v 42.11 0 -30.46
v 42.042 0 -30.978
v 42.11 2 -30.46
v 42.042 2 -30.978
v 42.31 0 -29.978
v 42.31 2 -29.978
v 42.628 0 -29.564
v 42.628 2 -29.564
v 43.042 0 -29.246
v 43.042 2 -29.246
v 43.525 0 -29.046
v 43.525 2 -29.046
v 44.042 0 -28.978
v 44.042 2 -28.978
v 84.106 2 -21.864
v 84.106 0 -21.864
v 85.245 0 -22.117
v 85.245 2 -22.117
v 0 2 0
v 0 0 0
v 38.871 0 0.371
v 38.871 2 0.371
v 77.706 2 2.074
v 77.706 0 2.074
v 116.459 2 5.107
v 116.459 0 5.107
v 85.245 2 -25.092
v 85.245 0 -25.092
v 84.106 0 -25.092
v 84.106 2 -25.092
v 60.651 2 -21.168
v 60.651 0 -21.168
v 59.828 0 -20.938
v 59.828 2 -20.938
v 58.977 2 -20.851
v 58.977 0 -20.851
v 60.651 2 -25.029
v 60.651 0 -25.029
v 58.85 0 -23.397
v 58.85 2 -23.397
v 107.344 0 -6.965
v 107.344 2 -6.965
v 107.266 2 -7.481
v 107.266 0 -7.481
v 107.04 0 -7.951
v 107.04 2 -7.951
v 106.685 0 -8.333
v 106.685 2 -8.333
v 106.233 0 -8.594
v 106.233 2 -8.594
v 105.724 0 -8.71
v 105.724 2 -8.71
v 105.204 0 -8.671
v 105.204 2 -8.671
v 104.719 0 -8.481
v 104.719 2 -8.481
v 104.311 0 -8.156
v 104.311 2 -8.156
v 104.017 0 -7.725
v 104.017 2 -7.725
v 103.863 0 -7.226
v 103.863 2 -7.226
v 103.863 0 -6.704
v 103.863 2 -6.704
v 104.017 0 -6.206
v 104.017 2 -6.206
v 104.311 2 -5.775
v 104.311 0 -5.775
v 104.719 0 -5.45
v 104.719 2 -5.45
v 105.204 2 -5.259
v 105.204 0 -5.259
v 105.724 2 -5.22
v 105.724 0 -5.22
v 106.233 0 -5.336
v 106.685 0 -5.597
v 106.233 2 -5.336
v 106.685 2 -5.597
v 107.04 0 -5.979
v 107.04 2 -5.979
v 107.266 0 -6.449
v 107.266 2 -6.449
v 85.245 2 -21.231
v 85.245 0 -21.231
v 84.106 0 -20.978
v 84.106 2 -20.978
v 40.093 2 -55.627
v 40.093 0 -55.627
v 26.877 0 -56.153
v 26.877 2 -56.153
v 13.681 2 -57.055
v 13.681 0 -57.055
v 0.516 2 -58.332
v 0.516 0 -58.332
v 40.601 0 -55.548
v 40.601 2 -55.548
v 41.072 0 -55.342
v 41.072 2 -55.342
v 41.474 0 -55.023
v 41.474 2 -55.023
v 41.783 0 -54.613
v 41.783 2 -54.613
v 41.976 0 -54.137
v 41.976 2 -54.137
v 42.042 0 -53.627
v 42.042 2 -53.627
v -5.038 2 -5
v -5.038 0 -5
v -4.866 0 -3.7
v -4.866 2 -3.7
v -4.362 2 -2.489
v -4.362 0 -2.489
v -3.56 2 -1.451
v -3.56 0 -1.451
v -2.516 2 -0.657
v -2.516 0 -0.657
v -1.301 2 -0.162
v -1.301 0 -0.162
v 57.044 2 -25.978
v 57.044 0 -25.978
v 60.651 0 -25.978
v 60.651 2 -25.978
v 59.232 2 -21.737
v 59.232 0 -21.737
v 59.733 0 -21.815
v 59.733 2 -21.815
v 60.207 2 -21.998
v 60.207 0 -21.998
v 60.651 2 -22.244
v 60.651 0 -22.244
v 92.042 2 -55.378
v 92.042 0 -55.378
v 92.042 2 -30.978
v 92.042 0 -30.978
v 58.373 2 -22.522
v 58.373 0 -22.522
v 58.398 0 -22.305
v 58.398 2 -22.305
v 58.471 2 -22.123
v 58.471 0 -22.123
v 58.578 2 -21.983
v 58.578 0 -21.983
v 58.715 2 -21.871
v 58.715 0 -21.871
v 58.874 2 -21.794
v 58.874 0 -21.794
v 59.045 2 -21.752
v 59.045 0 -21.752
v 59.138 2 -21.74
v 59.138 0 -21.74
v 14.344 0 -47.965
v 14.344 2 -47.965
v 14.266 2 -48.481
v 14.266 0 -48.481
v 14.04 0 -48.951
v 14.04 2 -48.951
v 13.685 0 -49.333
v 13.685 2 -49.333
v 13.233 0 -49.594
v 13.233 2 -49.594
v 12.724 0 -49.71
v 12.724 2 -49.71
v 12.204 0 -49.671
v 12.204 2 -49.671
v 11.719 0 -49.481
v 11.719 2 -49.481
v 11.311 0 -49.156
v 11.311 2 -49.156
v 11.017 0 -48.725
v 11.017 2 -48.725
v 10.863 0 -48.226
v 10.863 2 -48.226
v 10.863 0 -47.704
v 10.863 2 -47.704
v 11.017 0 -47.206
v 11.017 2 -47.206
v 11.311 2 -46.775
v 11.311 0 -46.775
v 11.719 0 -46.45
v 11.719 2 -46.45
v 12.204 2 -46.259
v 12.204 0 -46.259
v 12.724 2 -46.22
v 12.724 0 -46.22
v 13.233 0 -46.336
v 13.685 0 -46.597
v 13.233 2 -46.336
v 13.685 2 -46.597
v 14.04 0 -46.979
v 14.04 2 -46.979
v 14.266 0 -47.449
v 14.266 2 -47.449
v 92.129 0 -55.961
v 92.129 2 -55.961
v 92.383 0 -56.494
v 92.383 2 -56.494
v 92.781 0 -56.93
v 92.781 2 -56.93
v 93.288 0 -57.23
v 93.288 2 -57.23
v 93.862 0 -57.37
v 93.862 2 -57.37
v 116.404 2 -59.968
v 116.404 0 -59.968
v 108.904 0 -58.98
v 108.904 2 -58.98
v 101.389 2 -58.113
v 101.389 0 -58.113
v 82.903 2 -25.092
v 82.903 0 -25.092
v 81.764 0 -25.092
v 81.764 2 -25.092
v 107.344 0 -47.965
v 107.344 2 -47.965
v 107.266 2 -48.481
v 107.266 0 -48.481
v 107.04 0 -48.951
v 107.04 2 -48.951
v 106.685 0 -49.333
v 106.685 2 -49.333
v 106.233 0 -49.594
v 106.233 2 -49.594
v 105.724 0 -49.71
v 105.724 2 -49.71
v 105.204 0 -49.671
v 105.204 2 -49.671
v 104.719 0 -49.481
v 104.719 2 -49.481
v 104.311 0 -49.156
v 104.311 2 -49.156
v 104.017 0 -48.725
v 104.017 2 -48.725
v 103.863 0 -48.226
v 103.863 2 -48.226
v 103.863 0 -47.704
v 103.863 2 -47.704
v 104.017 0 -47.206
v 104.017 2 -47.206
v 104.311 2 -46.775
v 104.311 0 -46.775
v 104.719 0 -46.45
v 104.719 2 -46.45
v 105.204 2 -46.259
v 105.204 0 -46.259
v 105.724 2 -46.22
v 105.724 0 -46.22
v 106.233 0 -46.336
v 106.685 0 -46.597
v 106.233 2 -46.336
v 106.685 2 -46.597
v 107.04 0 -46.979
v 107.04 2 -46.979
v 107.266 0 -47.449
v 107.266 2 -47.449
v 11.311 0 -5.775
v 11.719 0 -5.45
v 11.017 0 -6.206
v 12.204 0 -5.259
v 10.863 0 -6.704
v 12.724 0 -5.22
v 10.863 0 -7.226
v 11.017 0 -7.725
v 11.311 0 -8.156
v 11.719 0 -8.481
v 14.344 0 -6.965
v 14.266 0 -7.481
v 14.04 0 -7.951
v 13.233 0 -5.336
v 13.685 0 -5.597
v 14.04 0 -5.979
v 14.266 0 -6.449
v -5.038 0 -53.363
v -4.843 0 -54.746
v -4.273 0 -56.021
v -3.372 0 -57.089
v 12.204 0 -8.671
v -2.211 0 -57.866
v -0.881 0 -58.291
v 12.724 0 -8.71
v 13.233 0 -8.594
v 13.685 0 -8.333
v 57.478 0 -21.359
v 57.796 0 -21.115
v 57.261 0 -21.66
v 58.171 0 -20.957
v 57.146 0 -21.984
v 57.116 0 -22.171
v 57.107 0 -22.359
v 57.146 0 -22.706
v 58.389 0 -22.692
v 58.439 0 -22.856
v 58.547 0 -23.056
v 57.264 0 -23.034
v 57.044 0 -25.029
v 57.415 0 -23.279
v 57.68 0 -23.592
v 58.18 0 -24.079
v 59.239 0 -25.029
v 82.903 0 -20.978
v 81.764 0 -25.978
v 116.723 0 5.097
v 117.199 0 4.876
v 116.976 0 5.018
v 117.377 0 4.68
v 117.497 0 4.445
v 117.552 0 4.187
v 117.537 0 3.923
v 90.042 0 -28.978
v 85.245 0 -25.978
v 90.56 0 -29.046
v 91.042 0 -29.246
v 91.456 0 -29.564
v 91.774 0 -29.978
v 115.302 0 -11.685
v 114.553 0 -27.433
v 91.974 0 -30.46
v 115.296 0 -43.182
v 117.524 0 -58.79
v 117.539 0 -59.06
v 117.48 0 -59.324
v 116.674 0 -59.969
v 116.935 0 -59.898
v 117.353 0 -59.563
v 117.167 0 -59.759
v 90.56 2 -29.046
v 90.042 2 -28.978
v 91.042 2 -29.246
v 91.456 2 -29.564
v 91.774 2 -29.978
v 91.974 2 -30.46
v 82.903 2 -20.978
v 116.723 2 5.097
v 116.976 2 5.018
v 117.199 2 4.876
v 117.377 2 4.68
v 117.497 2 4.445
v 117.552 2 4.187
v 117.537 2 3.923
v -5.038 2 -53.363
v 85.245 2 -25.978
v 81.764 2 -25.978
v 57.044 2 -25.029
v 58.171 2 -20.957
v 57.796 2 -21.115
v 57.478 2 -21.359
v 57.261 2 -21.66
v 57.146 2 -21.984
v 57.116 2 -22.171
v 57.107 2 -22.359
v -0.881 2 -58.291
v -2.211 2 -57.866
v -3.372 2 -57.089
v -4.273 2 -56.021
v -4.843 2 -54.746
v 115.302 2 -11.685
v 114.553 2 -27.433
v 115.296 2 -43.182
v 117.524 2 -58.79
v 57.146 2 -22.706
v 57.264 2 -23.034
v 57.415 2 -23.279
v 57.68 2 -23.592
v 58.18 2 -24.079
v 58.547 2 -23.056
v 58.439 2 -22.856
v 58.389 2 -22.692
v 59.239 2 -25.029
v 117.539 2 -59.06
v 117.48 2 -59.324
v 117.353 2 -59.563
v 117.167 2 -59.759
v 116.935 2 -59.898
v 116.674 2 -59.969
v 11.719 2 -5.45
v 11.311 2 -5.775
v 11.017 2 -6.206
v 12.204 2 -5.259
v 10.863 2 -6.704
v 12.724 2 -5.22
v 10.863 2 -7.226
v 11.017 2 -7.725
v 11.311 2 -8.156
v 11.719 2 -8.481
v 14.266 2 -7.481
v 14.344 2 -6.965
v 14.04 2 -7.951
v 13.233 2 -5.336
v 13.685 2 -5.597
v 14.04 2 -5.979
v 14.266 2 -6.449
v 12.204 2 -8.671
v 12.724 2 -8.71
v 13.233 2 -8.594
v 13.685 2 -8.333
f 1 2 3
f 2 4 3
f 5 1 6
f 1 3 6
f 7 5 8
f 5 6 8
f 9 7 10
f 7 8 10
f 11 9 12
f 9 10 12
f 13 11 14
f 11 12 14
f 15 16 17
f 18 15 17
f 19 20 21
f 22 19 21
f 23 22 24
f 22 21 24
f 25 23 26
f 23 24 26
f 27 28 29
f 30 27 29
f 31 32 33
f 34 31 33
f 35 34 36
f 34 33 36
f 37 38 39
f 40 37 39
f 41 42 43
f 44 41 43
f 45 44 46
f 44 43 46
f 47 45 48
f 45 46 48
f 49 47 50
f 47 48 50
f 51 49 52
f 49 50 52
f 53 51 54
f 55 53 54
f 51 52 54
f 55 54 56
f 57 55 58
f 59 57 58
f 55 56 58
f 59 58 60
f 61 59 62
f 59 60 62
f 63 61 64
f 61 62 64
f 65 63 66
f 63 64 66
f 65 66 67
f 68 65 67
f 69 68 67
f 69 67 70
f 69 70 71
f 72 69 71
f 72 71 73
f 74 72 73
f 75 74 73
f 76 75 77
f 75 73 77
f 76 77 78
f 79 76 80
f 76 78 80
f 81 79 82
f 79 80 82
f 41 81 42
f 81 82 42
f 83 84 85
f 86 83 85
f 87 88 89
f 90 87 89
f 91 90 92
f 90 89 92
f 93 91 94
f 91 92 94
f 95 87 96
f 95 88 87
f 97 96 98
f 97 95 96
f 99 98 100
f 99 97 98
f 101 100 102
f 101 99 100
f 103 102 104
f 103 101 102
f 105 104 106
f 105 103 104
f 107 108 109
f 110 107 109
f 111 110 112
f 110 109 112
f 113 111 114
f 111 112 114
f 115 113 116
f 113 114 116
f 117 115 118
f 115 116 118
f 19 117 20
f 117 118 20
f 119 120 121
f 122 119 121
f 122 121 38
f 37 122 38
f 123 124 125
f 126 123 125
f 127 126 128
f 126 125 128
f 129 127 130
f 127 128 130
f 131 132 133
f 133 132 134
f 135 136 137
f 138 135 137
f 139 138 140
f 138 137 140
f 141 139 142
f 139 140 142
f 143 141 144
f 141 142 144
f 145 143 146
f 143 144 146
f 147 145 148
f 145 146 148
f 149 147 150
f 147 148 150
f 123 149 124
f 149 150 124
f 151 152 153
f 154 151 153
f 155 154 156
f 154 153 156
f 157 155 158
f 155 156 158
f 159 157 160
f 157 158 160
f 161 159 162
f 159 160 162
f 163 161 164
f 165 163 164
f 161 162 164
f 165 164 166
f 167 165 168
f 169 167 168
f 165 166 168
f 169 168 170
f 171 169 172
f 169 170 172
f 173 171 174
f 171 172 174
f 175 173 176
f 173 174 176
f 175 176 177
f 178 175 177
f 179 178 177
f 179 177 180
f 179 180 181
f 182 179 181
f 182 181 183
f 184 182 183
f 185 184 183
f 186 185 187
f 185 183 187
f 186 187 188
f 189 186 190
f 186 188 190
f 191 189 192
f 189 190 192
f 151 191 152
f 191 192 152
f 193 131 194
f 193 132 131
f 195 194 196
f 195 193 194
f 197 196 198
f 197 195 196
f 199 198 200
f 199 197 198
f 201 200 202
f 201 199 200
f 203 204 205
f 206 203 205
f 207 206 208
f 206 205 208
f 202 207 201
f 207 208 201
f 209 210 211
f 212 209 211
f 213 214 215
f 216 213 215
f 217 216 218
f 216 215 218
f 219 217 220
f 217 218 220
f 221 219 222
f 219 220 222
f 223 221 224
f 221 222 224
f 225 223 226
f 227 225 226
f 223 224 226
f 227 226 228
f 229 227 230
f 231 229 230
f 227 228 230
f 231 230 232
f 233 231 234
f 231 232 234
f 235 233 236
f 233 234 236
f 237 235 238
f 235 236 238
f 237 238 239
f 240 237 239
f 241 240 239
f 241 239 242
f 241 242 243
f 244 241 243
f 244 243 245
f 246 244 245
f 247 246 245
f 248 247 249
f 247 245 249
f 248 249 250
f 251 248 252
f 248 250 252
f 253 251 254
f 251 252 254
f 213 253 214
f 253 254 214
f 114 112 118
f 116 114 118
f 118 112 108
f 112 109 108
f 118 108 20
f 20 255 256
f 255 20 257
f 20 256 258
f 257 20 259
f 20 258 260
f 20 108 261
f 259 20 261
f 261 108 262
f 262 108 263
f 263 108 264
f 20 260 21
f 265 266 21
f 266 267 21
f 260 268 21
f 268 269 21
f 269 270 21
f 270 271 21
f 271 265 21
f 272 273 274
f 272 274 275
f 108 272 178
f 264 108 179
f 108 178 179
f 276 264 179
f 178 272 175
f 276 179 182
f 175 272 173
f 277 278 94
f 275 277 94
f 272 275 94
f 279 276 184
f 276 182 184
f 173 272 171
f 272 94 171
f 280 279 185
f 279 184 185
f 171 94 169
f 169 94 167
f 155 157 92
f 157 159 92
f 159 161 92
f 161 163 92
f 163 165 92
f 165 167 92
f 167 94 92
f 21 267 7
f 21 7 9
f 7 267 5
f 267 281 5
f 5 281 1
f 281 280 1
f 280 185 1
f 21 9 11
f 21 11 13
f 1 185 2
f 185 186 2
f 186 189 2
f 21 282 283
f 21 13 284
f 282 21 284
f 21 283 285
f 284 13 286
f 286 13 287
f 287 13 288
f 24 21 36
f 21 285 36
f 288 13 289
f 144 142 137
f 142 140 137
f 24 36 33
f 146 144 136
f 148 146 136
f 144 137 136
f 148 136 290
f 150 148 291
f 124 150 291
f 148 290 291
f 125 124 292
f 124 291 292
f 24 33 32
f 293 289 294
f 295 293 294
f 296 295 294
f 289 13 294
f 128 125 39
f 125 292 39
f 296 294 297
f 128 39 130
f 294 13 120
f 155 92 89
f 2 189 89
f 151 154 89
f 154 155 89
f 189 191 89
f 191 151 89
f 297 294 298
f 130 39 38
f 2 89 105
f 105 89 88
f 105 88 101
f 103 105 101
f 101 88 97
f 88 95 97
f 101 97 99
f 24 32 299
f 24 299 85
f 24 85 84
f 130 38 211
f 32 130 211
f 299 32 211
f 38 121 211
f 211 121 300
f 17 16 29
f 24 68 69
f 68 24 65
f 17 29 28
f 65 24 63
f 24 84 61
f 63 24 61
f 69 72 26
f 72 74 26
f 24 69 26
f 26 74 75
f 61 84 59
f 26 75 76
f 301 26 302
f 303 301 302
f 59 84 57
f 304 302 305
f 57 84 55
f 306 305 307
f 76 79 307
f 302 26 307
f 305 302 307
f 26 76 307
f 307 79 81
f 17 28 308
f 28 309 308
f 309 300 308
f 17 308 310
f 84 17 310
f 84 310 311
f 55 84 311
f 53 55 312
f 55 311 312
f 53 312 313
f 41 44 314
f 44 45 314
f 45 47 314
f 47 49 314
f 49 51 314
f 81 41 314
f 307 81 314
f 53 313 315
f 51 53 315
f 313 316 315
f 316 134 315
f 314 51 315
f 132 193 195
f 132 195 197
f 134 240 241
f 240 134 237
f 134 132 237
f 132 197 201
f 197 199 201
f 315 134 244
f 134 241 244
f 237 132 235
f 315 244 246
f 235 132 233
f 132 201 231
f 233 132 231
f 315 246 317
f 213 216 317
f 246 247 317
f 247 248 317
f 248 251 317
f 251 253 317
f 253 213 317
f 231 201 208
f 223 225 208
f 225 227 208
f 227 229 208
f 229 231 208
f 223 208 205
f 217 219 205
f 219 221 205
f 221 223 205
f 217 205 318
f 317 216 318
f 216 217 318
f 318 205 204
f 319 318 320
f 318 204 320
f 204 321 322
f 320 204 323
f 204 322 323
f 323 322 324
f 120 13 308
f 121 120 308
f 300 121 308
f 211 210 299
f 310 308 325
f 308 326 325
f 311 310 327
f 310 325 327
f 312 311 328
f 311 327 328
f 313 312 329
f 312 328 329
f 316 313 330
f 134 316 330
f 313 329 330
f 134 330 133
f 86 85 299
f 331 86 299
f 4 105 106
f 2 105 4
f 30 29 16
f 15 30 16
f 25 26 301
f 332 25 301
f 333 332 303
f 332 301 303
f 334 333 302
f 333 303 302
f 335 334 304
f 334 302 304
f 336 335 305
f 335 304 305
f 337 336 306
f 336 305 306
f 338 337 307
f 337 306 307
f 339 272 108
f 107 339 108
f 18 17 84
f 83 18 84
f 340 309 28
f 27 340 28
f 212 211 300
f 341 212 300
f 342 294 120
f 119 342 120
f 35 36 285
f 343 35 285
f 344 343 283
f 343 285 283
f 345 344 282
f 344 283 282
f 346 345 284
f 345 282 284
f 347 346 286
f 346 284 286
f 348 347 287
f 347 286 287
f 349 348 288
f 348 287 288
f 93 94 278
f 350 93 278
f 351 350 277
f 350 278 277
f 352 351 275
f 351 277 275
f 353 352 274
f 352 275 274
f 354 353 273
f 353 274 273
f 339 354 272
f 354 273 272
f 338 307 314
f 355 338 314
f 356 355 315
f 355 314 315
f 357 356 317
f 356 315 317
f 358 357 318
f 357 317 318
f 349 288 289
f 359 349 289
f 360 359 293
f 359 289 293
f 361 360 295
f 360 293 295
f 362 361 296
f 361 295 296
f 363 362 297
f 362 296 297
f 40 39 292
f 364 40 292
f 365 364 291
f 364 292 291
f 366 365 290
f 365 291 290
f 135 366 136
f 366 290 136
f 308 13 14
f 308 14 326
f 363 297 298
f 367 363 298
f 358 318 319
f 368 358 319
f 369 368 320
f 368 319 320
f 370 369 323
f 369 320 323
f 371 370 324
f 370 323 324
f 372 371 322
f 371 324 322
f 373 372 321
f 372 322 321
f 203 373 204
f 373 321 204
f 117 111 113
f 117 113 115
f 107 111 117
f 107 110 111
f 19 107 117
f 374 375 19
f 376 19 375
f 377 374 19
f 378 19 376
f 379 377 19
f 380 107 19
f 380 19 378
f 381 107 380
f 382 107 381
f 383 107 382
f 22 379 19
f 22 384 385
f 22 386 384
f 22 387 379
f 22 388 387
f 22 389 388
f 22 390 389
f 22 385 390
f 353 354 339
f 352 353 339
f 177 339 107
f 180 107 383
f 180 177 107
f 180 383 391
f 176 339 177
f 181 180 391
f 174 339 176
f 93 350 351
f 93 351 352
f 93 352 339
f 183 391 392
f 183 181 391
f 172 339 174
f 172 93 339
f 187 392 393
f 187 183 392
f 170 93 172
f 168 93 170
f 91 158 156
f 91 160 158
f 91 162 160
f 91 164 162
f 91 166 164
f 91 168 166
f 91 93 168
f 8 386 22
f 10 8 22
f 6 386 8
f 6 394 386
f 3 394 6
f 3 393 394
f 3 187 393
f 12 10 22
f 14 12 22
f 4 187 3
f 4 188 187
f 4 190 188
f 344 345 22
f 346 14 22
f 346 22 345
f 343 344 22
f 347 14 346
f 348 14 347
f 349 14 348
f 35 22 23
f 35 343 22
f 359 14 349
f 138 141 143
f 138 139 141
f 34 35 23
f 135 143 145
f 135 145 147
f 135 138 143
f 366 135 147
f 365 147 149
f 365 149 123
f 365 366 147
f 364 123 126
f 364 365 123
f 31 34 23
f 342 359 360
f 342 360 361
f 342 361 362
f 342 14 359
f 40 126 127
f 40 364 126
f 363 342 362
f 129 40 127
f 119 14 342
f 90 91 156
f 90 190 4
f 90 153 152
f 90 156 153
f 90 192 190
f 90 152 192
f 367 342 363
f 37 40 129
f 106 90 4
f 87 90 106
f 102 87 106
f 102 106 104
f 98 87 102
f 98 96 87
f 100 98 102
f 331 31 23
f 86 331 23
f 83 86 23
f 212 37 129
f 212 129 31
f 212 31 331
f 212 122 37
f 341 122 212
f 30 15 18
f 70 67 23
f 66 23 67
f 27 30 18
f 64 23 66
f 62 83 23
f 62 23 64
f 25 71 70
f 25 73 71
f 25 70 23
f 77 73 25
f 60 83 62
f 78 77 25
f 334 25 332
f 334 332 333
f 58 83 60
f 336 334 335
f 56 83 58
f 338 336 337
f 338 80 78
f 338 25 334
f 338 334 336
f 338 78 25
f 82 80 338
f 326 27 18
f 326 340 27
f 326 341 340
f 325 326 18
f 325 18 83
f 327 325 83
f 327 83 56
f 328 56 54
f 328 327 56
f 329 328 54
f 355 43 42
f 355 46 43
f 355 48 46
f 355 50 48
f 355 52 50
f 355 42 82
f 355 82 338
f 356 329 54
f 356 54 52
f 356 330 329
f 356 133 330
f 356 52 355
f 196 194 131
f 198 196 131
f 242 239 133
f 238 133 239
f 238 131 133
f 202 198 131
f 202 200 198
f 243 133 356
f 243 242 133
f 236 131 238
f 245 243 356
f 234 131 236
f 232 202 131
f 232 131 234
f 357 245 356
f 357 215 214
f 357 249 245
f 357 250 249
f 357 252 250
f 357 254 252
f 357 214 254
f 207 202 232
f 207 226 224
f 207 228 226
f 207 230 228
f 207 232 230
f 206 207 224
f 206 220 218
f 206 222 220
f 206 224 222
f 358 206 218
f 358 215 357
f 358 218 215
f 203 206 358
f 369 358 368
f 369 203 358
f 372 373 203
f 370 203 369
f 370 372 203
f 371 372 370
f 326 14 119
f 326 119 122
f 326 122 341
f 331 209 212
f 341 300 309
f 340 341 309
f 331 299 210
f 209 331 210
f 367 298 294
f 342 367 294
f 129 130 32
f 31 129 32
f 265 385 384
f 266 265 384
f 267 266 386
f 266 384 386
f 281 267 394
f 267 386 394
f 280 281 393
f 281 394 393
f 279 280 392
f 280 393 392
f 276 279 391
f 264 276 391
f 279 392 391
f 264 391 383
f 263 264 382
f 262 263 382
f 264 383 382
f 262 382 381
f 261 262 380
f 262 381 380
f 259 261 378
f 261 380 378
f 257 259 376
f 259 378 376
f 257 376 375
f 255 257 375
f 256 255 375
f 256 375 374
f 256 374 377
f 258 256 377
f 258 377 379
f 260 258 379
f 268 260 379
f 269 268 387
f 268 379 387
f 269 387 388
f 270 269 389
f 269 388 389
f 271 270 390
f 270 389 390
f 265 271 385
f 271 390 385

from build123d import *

# Parameters (mm, degrees)
CROQUIS1_R              = 2.175
SALIENTE_EXTRUIR1_DEPTH = 2
CROQUIS2_R              = 2.175
CROQUIS2_R_2            = 1.75
SALIENTE_EXTRUIR2_DEPTH = 2
CROQUIS3_W              = 50
CROQUIS3_H              = 30
CORTAR_EXTRUIR1_DEPTH   = 2
REDONDEO1_R             = 2
CORTAR_EXTRUIR2_DEPTH   = 2


with BuildPart() as part:
    # Croquis1 → Saliente-Extruir1 (new body)
    with BuildSketch(Plane(origin=(0, 0, 0), x_dir=(1, 0, 0), z_dir=(0, 1, 0))):
        with BuildLine():
            Line((-5.038018703, 53.362868047), (-5.038018703, 4.999855456))
            ThreePointArc((-5.038018703, 4.999855456), (-3.560085318, 1.450905363), (0, 0))
            ThreePointArc((0, 0), (58.295330849, -1.055734), (116.459334215, -5.106522257))
            ThreePointArc((116.459334215, -5.106522257), (117.294081225, -4.78404952), (117.536525368, -3.922648293))
            ThreePointArc((117.536525368, -3.922648293), (114.552978917, 27.433067341), (117.524427855, 58.789931717))
            ThreePointArc((117.524427855, 58.789931717), (117.266809662, 59.667185903), (116.403513339, 59.968286381))
            ThreePointArc((116.403513339, 59.968286381), (58.510820536, 55.521592761), (0.515666266, 58.332116778))
            ThreePointArc((0.515666266, 58.332116778), (-3.372053433, 57.089020542), (-5.038018703, 53.362868047))
        make_face()
        with Locations((105.593713907, 6.96520452)):
            Circle(CROQUIS1_R, mode=Mode.SUBTRACT)
        with Locations((105.593713907, 47.96520452)):
            Circle(CROQUIS1_R, mode=Mode.SUBTRACT)
        with Locations((12.593713907, 47.96520452)):
            Circle(CROQUIS1_R, mode=Mode.SUBTRACT)
        with Locations((12.593713907, 6.96520452)):
            Circle(CROQUIS1_R, mode=Mode.SUBTRACT)
    extrude(amount=SALIENTE_EXTRUIR1_DEPTH)

    # Croquis2 → Saliente-Extruir2 (add)
    with BuildSketch(Plane(origin=(0, 2, 0), x_dir=(1, 0, 0), z_dir=(0, 1, 0))):
        with Locations((12.593713907, 6.96520452)):
            Circle(CROQUIS2_R)
        with Locations((12.593713907, 6.96520452)):
            Circle(CROQUIS2_R_2, mode=Mode.SUBTRACT)
        with Locations((105.593713907, 6.96520452)):
            Circle(CROQUIS2_R)
        with Locations((105.593713907, 6.96520452)):
            Circle(CROQUIS2_R_2, mode=Mode.SUBTRACT)
        with Locations((105.593713907, 47.96520452)):
            Circle(CROQUIS2_R)
        with Locations((105.593713907, 47.96520452)):
            Circle(CROQUIS2_R_2, mode=Mode.SUBTRACT)
        with Locations((12.593713907, 47.96520452)):
            Circle(CROQUIS2_R)
        with Locations((12.593713907, 47.96520452)):
            Circle(CROQUIS2_R_2, mode=Mode.SUBTRACT)
    extrude(amount=-SALIENTE_EXTRUIR2_DEPTH)

    # Croquis3 → Cortar-Extruir1 (cut)
    with BuildSketch(Plane.XZ):
        with Locations((67.042264057, -43.977959042)):
            Rectangle(CROQUIS3_W, CROQUIS3_H)
    extrude(amount=-CORTAR_EXTRUIR1_DEPTH, mode=Mode.SUBTRACT)

    # Redondeo1
    redondeo1_edges = [part.edges().sort_by_distance(p)[0] for p in [
        (92.042264057, 1, -57.208472181),
        (42.042264057, 1, -55.581052497),
        (92.042264057, 1, -28.977959042),
        (42.042264057, 1, -28.977959042),
    ]]
    fillet(redondeo1_edges, radius=REDONDEO1_R)

    # Croquis5 → Cortar-Extruir2 (cut)
    with BuildSketch(Plane.XZ):
        Polygon((85.245219848, -25.091883093), (84.105979342, -25.091883093), (84.105979342, -21.864034991), (85.245219848, -22.117199548), (85.245219848, -21.231123599), (84.105979342, -20.977959042), (82.903447696, -20.977959042), (82.903447696, -25.091883093), (81.76420719, -25.091883093), (81.76420719, -25.977959042), (85.245219848, -25.977959042), align=None)
        with BuildLine():
            Line((59.23923156, -25.028591953), (57.043820167, -25.028591953))
            Line((57.043820167, -25.028591953), (57.043820167, -25.977959042))
            Line((57.043820167, -25.977959042), (60.651415104, -25.977959042))
            Line((60.651415104, -25.977959042), (60.651415104, -25.028591953))
            Line((60.651415104, -25.028591953), (58.849595484, -23.39686727))
            add(Edge.make_bspline(
                [(58.849595484, -23.39686727), (58.811179508, -23.360453729), (58.737347895, -23.290470593), (58.638846251, -23.181308349), (58.556039894, -23.073418427), (58.488647556, -22.9656663), (58.436579253, -22.857270202), (58.399356742, -22.7471273), (58.376788079, -22.635006299), (58.374215363, -22.559348688), (58.372934091, -22.521669485)],
                knots=[0, 0, 0, 0, 0.000158749, 0.0003051, 0.000440586, 0.000566273, 0.000685704, 0.000800474, 0.000914321, 0.001027271, 0.001027271, 0.001027271, 0.001027271], degree=3))
            add(Edge.make_bspline(
                [(58.372934091, -22.521669485), (58.373734222, -22.492954485), (58.375303557, -22.436634341), (58.386395262, -22.354534572), (58.403952327, -22.27651726), (58.429843029, -22.202852998), (58.463496065, -22.13358734), (58.504554072, -22.068788136), (58.55230711, -22.007870779), (58.607454048, -21.95191928), (58.668588665, -21.901761082), (58.734750953, -21.857510772), (58.805768742, -21.820347701), (58.881617778, -21.78880132), (58.962945343, -21.766978108), (59.048496141, -21.750115414), (59.138706913, -21.738517651), (59.200626269, -21.737813177), (59.232309091, -21.737452713)],
                knots=[0, 0, 0, 0, 8.6127e-05, 0.000168926, 0.000248089, 0.000325655, 0.000402613, 0.000478613, 0.000555374, 0.000634395, 0.000713787, 0.00079223, 0.000872741, 0.000953911, 0.001038132, 0.001124825, 0.001215473, 0.001310456, 0.001310456, 0.001310456, 0.001310456], degree=3))
            add(Edge.make_bspline(
                [(59.232309091, -21.737452713), (59.283483298, -21.739078861), (59.388654688, -21.742420863), (59.549919694, -21.767428422), (59.717848281, -21.808754845), (59.893140764, -21.864093074), (60.074545452, -21.936143809), (60.262356788, -22.023375721), (60.45625408, -22.126411077), (60.585178282, -22.203946693), (60.651415104, -22.243781827)],
                knots=[0, 0, 0, 0, 0.000153487, 0.000315441, 0.000488379, 0.00067197, 0.000866447, 0.001073517, 0.001292942, 0.001524792, 0.001524792, 0.001524792, 0.001524792], degree=3))
            Line((60.651415104, -22.243781827), (60.651415104, -21.16783246))
            add(Edge.make_bspline(
                [(60.651415104, -21.16783246), (60.580024738, -21.143346845), (60.438298447, -21.094737271), (60.22526093, -21.029932245), (60.012697372, -20.977227076), (59.802522423, -20.931042179), (59.593297587, -20.895451623), (59.386119489, -20.869557673), (59.180786794, -20.854336471), (59.044767338, -20.852359369), (58.977166686, -20.851376764)],
                knots=[0, 0, 0, 0, 0.000226414, 0.000449484, 0.000667747, 0.000883244, 0.001094922, 0.001304182, 0.001509426, 0.001712216, 0.001712216, 0.001712216, 0.001712216], degree=3))
            add(Edge.make_bspline(
                [(58.977166686, -20.851376764), (58.905262711, -20.85238657), (58.765150213, -20.854354283), (58.561236326, -20.873331522), (58.369861257, -20.904710686), (58.190983935, -20.948290574), (58.02362641, -21.003040105), (57.869196403, -21.072605629), (57.726828905, -21.153727261), (57.597883717, -21.246919107), (57.482225307, -21.350888685), (57.382280492, -21.4662574), (57.296169552, -21.590505745), (57.226253234, -21.725372616), (57.173379692, -21.870513757), (57.134463349, -22.024856787), (57.111652808, -22.189040836), (57.108650287, -22.301727129), (57.107111307, -22.359485941)],
                knots=[0, 0, 0, 0, 0.000215667, 0.00042025, 0.000613718, 0.000796966, 0.000972092, 0.001141183, 0.0013042, 0.001462847, 0.001617578, 0.001769683, 0.001919729, 0.002070114, 0.002224056, 0.002382117, 0.002546867, 0.00272011, 0.00272011, 0.00272011, 0.00272011], degree=3))
            add(Edge.make_bspline(
                [(57.107111307, -22.359485941), (57.109580941, -22.426905794), (57.114488685, -22.560884856), (57.153988801, -22.758138197), (57.220643738, -22.947717445), (57.29612885, -23.101195245), (57.373494642, -23.224613477), (57.44767263, -23.324133234), (57.534574057, -23.431842783), (57.636091495, -23.546775274), (57.751967056, -23.669028973), (57.881725831, -23.799417167), (58.024876774, -23.938220802), (58.127076255, -24.031061987), (58.180093902, -24.079224865)],
                knots=[0, 0, 0, 0, 0.00020215, 0.000401719, 0.000600628, 0.000803627, 0.00091338, 0.001037201, 0.001175739, 0.001328495, 0.001497091, 0.001681002, 0.001880326, 0.002095195, 0.002095195, 0.002095195, 0.002095195], degree=3))
            Line((58.180093902, -24.079224865), (59.23923156, -25.028591953))
        make_face()
    extrude(amount=-CORTAR_EXTRUIR2_DEPTH, mode=Mode.SUBTRACT)


solid = part.part
